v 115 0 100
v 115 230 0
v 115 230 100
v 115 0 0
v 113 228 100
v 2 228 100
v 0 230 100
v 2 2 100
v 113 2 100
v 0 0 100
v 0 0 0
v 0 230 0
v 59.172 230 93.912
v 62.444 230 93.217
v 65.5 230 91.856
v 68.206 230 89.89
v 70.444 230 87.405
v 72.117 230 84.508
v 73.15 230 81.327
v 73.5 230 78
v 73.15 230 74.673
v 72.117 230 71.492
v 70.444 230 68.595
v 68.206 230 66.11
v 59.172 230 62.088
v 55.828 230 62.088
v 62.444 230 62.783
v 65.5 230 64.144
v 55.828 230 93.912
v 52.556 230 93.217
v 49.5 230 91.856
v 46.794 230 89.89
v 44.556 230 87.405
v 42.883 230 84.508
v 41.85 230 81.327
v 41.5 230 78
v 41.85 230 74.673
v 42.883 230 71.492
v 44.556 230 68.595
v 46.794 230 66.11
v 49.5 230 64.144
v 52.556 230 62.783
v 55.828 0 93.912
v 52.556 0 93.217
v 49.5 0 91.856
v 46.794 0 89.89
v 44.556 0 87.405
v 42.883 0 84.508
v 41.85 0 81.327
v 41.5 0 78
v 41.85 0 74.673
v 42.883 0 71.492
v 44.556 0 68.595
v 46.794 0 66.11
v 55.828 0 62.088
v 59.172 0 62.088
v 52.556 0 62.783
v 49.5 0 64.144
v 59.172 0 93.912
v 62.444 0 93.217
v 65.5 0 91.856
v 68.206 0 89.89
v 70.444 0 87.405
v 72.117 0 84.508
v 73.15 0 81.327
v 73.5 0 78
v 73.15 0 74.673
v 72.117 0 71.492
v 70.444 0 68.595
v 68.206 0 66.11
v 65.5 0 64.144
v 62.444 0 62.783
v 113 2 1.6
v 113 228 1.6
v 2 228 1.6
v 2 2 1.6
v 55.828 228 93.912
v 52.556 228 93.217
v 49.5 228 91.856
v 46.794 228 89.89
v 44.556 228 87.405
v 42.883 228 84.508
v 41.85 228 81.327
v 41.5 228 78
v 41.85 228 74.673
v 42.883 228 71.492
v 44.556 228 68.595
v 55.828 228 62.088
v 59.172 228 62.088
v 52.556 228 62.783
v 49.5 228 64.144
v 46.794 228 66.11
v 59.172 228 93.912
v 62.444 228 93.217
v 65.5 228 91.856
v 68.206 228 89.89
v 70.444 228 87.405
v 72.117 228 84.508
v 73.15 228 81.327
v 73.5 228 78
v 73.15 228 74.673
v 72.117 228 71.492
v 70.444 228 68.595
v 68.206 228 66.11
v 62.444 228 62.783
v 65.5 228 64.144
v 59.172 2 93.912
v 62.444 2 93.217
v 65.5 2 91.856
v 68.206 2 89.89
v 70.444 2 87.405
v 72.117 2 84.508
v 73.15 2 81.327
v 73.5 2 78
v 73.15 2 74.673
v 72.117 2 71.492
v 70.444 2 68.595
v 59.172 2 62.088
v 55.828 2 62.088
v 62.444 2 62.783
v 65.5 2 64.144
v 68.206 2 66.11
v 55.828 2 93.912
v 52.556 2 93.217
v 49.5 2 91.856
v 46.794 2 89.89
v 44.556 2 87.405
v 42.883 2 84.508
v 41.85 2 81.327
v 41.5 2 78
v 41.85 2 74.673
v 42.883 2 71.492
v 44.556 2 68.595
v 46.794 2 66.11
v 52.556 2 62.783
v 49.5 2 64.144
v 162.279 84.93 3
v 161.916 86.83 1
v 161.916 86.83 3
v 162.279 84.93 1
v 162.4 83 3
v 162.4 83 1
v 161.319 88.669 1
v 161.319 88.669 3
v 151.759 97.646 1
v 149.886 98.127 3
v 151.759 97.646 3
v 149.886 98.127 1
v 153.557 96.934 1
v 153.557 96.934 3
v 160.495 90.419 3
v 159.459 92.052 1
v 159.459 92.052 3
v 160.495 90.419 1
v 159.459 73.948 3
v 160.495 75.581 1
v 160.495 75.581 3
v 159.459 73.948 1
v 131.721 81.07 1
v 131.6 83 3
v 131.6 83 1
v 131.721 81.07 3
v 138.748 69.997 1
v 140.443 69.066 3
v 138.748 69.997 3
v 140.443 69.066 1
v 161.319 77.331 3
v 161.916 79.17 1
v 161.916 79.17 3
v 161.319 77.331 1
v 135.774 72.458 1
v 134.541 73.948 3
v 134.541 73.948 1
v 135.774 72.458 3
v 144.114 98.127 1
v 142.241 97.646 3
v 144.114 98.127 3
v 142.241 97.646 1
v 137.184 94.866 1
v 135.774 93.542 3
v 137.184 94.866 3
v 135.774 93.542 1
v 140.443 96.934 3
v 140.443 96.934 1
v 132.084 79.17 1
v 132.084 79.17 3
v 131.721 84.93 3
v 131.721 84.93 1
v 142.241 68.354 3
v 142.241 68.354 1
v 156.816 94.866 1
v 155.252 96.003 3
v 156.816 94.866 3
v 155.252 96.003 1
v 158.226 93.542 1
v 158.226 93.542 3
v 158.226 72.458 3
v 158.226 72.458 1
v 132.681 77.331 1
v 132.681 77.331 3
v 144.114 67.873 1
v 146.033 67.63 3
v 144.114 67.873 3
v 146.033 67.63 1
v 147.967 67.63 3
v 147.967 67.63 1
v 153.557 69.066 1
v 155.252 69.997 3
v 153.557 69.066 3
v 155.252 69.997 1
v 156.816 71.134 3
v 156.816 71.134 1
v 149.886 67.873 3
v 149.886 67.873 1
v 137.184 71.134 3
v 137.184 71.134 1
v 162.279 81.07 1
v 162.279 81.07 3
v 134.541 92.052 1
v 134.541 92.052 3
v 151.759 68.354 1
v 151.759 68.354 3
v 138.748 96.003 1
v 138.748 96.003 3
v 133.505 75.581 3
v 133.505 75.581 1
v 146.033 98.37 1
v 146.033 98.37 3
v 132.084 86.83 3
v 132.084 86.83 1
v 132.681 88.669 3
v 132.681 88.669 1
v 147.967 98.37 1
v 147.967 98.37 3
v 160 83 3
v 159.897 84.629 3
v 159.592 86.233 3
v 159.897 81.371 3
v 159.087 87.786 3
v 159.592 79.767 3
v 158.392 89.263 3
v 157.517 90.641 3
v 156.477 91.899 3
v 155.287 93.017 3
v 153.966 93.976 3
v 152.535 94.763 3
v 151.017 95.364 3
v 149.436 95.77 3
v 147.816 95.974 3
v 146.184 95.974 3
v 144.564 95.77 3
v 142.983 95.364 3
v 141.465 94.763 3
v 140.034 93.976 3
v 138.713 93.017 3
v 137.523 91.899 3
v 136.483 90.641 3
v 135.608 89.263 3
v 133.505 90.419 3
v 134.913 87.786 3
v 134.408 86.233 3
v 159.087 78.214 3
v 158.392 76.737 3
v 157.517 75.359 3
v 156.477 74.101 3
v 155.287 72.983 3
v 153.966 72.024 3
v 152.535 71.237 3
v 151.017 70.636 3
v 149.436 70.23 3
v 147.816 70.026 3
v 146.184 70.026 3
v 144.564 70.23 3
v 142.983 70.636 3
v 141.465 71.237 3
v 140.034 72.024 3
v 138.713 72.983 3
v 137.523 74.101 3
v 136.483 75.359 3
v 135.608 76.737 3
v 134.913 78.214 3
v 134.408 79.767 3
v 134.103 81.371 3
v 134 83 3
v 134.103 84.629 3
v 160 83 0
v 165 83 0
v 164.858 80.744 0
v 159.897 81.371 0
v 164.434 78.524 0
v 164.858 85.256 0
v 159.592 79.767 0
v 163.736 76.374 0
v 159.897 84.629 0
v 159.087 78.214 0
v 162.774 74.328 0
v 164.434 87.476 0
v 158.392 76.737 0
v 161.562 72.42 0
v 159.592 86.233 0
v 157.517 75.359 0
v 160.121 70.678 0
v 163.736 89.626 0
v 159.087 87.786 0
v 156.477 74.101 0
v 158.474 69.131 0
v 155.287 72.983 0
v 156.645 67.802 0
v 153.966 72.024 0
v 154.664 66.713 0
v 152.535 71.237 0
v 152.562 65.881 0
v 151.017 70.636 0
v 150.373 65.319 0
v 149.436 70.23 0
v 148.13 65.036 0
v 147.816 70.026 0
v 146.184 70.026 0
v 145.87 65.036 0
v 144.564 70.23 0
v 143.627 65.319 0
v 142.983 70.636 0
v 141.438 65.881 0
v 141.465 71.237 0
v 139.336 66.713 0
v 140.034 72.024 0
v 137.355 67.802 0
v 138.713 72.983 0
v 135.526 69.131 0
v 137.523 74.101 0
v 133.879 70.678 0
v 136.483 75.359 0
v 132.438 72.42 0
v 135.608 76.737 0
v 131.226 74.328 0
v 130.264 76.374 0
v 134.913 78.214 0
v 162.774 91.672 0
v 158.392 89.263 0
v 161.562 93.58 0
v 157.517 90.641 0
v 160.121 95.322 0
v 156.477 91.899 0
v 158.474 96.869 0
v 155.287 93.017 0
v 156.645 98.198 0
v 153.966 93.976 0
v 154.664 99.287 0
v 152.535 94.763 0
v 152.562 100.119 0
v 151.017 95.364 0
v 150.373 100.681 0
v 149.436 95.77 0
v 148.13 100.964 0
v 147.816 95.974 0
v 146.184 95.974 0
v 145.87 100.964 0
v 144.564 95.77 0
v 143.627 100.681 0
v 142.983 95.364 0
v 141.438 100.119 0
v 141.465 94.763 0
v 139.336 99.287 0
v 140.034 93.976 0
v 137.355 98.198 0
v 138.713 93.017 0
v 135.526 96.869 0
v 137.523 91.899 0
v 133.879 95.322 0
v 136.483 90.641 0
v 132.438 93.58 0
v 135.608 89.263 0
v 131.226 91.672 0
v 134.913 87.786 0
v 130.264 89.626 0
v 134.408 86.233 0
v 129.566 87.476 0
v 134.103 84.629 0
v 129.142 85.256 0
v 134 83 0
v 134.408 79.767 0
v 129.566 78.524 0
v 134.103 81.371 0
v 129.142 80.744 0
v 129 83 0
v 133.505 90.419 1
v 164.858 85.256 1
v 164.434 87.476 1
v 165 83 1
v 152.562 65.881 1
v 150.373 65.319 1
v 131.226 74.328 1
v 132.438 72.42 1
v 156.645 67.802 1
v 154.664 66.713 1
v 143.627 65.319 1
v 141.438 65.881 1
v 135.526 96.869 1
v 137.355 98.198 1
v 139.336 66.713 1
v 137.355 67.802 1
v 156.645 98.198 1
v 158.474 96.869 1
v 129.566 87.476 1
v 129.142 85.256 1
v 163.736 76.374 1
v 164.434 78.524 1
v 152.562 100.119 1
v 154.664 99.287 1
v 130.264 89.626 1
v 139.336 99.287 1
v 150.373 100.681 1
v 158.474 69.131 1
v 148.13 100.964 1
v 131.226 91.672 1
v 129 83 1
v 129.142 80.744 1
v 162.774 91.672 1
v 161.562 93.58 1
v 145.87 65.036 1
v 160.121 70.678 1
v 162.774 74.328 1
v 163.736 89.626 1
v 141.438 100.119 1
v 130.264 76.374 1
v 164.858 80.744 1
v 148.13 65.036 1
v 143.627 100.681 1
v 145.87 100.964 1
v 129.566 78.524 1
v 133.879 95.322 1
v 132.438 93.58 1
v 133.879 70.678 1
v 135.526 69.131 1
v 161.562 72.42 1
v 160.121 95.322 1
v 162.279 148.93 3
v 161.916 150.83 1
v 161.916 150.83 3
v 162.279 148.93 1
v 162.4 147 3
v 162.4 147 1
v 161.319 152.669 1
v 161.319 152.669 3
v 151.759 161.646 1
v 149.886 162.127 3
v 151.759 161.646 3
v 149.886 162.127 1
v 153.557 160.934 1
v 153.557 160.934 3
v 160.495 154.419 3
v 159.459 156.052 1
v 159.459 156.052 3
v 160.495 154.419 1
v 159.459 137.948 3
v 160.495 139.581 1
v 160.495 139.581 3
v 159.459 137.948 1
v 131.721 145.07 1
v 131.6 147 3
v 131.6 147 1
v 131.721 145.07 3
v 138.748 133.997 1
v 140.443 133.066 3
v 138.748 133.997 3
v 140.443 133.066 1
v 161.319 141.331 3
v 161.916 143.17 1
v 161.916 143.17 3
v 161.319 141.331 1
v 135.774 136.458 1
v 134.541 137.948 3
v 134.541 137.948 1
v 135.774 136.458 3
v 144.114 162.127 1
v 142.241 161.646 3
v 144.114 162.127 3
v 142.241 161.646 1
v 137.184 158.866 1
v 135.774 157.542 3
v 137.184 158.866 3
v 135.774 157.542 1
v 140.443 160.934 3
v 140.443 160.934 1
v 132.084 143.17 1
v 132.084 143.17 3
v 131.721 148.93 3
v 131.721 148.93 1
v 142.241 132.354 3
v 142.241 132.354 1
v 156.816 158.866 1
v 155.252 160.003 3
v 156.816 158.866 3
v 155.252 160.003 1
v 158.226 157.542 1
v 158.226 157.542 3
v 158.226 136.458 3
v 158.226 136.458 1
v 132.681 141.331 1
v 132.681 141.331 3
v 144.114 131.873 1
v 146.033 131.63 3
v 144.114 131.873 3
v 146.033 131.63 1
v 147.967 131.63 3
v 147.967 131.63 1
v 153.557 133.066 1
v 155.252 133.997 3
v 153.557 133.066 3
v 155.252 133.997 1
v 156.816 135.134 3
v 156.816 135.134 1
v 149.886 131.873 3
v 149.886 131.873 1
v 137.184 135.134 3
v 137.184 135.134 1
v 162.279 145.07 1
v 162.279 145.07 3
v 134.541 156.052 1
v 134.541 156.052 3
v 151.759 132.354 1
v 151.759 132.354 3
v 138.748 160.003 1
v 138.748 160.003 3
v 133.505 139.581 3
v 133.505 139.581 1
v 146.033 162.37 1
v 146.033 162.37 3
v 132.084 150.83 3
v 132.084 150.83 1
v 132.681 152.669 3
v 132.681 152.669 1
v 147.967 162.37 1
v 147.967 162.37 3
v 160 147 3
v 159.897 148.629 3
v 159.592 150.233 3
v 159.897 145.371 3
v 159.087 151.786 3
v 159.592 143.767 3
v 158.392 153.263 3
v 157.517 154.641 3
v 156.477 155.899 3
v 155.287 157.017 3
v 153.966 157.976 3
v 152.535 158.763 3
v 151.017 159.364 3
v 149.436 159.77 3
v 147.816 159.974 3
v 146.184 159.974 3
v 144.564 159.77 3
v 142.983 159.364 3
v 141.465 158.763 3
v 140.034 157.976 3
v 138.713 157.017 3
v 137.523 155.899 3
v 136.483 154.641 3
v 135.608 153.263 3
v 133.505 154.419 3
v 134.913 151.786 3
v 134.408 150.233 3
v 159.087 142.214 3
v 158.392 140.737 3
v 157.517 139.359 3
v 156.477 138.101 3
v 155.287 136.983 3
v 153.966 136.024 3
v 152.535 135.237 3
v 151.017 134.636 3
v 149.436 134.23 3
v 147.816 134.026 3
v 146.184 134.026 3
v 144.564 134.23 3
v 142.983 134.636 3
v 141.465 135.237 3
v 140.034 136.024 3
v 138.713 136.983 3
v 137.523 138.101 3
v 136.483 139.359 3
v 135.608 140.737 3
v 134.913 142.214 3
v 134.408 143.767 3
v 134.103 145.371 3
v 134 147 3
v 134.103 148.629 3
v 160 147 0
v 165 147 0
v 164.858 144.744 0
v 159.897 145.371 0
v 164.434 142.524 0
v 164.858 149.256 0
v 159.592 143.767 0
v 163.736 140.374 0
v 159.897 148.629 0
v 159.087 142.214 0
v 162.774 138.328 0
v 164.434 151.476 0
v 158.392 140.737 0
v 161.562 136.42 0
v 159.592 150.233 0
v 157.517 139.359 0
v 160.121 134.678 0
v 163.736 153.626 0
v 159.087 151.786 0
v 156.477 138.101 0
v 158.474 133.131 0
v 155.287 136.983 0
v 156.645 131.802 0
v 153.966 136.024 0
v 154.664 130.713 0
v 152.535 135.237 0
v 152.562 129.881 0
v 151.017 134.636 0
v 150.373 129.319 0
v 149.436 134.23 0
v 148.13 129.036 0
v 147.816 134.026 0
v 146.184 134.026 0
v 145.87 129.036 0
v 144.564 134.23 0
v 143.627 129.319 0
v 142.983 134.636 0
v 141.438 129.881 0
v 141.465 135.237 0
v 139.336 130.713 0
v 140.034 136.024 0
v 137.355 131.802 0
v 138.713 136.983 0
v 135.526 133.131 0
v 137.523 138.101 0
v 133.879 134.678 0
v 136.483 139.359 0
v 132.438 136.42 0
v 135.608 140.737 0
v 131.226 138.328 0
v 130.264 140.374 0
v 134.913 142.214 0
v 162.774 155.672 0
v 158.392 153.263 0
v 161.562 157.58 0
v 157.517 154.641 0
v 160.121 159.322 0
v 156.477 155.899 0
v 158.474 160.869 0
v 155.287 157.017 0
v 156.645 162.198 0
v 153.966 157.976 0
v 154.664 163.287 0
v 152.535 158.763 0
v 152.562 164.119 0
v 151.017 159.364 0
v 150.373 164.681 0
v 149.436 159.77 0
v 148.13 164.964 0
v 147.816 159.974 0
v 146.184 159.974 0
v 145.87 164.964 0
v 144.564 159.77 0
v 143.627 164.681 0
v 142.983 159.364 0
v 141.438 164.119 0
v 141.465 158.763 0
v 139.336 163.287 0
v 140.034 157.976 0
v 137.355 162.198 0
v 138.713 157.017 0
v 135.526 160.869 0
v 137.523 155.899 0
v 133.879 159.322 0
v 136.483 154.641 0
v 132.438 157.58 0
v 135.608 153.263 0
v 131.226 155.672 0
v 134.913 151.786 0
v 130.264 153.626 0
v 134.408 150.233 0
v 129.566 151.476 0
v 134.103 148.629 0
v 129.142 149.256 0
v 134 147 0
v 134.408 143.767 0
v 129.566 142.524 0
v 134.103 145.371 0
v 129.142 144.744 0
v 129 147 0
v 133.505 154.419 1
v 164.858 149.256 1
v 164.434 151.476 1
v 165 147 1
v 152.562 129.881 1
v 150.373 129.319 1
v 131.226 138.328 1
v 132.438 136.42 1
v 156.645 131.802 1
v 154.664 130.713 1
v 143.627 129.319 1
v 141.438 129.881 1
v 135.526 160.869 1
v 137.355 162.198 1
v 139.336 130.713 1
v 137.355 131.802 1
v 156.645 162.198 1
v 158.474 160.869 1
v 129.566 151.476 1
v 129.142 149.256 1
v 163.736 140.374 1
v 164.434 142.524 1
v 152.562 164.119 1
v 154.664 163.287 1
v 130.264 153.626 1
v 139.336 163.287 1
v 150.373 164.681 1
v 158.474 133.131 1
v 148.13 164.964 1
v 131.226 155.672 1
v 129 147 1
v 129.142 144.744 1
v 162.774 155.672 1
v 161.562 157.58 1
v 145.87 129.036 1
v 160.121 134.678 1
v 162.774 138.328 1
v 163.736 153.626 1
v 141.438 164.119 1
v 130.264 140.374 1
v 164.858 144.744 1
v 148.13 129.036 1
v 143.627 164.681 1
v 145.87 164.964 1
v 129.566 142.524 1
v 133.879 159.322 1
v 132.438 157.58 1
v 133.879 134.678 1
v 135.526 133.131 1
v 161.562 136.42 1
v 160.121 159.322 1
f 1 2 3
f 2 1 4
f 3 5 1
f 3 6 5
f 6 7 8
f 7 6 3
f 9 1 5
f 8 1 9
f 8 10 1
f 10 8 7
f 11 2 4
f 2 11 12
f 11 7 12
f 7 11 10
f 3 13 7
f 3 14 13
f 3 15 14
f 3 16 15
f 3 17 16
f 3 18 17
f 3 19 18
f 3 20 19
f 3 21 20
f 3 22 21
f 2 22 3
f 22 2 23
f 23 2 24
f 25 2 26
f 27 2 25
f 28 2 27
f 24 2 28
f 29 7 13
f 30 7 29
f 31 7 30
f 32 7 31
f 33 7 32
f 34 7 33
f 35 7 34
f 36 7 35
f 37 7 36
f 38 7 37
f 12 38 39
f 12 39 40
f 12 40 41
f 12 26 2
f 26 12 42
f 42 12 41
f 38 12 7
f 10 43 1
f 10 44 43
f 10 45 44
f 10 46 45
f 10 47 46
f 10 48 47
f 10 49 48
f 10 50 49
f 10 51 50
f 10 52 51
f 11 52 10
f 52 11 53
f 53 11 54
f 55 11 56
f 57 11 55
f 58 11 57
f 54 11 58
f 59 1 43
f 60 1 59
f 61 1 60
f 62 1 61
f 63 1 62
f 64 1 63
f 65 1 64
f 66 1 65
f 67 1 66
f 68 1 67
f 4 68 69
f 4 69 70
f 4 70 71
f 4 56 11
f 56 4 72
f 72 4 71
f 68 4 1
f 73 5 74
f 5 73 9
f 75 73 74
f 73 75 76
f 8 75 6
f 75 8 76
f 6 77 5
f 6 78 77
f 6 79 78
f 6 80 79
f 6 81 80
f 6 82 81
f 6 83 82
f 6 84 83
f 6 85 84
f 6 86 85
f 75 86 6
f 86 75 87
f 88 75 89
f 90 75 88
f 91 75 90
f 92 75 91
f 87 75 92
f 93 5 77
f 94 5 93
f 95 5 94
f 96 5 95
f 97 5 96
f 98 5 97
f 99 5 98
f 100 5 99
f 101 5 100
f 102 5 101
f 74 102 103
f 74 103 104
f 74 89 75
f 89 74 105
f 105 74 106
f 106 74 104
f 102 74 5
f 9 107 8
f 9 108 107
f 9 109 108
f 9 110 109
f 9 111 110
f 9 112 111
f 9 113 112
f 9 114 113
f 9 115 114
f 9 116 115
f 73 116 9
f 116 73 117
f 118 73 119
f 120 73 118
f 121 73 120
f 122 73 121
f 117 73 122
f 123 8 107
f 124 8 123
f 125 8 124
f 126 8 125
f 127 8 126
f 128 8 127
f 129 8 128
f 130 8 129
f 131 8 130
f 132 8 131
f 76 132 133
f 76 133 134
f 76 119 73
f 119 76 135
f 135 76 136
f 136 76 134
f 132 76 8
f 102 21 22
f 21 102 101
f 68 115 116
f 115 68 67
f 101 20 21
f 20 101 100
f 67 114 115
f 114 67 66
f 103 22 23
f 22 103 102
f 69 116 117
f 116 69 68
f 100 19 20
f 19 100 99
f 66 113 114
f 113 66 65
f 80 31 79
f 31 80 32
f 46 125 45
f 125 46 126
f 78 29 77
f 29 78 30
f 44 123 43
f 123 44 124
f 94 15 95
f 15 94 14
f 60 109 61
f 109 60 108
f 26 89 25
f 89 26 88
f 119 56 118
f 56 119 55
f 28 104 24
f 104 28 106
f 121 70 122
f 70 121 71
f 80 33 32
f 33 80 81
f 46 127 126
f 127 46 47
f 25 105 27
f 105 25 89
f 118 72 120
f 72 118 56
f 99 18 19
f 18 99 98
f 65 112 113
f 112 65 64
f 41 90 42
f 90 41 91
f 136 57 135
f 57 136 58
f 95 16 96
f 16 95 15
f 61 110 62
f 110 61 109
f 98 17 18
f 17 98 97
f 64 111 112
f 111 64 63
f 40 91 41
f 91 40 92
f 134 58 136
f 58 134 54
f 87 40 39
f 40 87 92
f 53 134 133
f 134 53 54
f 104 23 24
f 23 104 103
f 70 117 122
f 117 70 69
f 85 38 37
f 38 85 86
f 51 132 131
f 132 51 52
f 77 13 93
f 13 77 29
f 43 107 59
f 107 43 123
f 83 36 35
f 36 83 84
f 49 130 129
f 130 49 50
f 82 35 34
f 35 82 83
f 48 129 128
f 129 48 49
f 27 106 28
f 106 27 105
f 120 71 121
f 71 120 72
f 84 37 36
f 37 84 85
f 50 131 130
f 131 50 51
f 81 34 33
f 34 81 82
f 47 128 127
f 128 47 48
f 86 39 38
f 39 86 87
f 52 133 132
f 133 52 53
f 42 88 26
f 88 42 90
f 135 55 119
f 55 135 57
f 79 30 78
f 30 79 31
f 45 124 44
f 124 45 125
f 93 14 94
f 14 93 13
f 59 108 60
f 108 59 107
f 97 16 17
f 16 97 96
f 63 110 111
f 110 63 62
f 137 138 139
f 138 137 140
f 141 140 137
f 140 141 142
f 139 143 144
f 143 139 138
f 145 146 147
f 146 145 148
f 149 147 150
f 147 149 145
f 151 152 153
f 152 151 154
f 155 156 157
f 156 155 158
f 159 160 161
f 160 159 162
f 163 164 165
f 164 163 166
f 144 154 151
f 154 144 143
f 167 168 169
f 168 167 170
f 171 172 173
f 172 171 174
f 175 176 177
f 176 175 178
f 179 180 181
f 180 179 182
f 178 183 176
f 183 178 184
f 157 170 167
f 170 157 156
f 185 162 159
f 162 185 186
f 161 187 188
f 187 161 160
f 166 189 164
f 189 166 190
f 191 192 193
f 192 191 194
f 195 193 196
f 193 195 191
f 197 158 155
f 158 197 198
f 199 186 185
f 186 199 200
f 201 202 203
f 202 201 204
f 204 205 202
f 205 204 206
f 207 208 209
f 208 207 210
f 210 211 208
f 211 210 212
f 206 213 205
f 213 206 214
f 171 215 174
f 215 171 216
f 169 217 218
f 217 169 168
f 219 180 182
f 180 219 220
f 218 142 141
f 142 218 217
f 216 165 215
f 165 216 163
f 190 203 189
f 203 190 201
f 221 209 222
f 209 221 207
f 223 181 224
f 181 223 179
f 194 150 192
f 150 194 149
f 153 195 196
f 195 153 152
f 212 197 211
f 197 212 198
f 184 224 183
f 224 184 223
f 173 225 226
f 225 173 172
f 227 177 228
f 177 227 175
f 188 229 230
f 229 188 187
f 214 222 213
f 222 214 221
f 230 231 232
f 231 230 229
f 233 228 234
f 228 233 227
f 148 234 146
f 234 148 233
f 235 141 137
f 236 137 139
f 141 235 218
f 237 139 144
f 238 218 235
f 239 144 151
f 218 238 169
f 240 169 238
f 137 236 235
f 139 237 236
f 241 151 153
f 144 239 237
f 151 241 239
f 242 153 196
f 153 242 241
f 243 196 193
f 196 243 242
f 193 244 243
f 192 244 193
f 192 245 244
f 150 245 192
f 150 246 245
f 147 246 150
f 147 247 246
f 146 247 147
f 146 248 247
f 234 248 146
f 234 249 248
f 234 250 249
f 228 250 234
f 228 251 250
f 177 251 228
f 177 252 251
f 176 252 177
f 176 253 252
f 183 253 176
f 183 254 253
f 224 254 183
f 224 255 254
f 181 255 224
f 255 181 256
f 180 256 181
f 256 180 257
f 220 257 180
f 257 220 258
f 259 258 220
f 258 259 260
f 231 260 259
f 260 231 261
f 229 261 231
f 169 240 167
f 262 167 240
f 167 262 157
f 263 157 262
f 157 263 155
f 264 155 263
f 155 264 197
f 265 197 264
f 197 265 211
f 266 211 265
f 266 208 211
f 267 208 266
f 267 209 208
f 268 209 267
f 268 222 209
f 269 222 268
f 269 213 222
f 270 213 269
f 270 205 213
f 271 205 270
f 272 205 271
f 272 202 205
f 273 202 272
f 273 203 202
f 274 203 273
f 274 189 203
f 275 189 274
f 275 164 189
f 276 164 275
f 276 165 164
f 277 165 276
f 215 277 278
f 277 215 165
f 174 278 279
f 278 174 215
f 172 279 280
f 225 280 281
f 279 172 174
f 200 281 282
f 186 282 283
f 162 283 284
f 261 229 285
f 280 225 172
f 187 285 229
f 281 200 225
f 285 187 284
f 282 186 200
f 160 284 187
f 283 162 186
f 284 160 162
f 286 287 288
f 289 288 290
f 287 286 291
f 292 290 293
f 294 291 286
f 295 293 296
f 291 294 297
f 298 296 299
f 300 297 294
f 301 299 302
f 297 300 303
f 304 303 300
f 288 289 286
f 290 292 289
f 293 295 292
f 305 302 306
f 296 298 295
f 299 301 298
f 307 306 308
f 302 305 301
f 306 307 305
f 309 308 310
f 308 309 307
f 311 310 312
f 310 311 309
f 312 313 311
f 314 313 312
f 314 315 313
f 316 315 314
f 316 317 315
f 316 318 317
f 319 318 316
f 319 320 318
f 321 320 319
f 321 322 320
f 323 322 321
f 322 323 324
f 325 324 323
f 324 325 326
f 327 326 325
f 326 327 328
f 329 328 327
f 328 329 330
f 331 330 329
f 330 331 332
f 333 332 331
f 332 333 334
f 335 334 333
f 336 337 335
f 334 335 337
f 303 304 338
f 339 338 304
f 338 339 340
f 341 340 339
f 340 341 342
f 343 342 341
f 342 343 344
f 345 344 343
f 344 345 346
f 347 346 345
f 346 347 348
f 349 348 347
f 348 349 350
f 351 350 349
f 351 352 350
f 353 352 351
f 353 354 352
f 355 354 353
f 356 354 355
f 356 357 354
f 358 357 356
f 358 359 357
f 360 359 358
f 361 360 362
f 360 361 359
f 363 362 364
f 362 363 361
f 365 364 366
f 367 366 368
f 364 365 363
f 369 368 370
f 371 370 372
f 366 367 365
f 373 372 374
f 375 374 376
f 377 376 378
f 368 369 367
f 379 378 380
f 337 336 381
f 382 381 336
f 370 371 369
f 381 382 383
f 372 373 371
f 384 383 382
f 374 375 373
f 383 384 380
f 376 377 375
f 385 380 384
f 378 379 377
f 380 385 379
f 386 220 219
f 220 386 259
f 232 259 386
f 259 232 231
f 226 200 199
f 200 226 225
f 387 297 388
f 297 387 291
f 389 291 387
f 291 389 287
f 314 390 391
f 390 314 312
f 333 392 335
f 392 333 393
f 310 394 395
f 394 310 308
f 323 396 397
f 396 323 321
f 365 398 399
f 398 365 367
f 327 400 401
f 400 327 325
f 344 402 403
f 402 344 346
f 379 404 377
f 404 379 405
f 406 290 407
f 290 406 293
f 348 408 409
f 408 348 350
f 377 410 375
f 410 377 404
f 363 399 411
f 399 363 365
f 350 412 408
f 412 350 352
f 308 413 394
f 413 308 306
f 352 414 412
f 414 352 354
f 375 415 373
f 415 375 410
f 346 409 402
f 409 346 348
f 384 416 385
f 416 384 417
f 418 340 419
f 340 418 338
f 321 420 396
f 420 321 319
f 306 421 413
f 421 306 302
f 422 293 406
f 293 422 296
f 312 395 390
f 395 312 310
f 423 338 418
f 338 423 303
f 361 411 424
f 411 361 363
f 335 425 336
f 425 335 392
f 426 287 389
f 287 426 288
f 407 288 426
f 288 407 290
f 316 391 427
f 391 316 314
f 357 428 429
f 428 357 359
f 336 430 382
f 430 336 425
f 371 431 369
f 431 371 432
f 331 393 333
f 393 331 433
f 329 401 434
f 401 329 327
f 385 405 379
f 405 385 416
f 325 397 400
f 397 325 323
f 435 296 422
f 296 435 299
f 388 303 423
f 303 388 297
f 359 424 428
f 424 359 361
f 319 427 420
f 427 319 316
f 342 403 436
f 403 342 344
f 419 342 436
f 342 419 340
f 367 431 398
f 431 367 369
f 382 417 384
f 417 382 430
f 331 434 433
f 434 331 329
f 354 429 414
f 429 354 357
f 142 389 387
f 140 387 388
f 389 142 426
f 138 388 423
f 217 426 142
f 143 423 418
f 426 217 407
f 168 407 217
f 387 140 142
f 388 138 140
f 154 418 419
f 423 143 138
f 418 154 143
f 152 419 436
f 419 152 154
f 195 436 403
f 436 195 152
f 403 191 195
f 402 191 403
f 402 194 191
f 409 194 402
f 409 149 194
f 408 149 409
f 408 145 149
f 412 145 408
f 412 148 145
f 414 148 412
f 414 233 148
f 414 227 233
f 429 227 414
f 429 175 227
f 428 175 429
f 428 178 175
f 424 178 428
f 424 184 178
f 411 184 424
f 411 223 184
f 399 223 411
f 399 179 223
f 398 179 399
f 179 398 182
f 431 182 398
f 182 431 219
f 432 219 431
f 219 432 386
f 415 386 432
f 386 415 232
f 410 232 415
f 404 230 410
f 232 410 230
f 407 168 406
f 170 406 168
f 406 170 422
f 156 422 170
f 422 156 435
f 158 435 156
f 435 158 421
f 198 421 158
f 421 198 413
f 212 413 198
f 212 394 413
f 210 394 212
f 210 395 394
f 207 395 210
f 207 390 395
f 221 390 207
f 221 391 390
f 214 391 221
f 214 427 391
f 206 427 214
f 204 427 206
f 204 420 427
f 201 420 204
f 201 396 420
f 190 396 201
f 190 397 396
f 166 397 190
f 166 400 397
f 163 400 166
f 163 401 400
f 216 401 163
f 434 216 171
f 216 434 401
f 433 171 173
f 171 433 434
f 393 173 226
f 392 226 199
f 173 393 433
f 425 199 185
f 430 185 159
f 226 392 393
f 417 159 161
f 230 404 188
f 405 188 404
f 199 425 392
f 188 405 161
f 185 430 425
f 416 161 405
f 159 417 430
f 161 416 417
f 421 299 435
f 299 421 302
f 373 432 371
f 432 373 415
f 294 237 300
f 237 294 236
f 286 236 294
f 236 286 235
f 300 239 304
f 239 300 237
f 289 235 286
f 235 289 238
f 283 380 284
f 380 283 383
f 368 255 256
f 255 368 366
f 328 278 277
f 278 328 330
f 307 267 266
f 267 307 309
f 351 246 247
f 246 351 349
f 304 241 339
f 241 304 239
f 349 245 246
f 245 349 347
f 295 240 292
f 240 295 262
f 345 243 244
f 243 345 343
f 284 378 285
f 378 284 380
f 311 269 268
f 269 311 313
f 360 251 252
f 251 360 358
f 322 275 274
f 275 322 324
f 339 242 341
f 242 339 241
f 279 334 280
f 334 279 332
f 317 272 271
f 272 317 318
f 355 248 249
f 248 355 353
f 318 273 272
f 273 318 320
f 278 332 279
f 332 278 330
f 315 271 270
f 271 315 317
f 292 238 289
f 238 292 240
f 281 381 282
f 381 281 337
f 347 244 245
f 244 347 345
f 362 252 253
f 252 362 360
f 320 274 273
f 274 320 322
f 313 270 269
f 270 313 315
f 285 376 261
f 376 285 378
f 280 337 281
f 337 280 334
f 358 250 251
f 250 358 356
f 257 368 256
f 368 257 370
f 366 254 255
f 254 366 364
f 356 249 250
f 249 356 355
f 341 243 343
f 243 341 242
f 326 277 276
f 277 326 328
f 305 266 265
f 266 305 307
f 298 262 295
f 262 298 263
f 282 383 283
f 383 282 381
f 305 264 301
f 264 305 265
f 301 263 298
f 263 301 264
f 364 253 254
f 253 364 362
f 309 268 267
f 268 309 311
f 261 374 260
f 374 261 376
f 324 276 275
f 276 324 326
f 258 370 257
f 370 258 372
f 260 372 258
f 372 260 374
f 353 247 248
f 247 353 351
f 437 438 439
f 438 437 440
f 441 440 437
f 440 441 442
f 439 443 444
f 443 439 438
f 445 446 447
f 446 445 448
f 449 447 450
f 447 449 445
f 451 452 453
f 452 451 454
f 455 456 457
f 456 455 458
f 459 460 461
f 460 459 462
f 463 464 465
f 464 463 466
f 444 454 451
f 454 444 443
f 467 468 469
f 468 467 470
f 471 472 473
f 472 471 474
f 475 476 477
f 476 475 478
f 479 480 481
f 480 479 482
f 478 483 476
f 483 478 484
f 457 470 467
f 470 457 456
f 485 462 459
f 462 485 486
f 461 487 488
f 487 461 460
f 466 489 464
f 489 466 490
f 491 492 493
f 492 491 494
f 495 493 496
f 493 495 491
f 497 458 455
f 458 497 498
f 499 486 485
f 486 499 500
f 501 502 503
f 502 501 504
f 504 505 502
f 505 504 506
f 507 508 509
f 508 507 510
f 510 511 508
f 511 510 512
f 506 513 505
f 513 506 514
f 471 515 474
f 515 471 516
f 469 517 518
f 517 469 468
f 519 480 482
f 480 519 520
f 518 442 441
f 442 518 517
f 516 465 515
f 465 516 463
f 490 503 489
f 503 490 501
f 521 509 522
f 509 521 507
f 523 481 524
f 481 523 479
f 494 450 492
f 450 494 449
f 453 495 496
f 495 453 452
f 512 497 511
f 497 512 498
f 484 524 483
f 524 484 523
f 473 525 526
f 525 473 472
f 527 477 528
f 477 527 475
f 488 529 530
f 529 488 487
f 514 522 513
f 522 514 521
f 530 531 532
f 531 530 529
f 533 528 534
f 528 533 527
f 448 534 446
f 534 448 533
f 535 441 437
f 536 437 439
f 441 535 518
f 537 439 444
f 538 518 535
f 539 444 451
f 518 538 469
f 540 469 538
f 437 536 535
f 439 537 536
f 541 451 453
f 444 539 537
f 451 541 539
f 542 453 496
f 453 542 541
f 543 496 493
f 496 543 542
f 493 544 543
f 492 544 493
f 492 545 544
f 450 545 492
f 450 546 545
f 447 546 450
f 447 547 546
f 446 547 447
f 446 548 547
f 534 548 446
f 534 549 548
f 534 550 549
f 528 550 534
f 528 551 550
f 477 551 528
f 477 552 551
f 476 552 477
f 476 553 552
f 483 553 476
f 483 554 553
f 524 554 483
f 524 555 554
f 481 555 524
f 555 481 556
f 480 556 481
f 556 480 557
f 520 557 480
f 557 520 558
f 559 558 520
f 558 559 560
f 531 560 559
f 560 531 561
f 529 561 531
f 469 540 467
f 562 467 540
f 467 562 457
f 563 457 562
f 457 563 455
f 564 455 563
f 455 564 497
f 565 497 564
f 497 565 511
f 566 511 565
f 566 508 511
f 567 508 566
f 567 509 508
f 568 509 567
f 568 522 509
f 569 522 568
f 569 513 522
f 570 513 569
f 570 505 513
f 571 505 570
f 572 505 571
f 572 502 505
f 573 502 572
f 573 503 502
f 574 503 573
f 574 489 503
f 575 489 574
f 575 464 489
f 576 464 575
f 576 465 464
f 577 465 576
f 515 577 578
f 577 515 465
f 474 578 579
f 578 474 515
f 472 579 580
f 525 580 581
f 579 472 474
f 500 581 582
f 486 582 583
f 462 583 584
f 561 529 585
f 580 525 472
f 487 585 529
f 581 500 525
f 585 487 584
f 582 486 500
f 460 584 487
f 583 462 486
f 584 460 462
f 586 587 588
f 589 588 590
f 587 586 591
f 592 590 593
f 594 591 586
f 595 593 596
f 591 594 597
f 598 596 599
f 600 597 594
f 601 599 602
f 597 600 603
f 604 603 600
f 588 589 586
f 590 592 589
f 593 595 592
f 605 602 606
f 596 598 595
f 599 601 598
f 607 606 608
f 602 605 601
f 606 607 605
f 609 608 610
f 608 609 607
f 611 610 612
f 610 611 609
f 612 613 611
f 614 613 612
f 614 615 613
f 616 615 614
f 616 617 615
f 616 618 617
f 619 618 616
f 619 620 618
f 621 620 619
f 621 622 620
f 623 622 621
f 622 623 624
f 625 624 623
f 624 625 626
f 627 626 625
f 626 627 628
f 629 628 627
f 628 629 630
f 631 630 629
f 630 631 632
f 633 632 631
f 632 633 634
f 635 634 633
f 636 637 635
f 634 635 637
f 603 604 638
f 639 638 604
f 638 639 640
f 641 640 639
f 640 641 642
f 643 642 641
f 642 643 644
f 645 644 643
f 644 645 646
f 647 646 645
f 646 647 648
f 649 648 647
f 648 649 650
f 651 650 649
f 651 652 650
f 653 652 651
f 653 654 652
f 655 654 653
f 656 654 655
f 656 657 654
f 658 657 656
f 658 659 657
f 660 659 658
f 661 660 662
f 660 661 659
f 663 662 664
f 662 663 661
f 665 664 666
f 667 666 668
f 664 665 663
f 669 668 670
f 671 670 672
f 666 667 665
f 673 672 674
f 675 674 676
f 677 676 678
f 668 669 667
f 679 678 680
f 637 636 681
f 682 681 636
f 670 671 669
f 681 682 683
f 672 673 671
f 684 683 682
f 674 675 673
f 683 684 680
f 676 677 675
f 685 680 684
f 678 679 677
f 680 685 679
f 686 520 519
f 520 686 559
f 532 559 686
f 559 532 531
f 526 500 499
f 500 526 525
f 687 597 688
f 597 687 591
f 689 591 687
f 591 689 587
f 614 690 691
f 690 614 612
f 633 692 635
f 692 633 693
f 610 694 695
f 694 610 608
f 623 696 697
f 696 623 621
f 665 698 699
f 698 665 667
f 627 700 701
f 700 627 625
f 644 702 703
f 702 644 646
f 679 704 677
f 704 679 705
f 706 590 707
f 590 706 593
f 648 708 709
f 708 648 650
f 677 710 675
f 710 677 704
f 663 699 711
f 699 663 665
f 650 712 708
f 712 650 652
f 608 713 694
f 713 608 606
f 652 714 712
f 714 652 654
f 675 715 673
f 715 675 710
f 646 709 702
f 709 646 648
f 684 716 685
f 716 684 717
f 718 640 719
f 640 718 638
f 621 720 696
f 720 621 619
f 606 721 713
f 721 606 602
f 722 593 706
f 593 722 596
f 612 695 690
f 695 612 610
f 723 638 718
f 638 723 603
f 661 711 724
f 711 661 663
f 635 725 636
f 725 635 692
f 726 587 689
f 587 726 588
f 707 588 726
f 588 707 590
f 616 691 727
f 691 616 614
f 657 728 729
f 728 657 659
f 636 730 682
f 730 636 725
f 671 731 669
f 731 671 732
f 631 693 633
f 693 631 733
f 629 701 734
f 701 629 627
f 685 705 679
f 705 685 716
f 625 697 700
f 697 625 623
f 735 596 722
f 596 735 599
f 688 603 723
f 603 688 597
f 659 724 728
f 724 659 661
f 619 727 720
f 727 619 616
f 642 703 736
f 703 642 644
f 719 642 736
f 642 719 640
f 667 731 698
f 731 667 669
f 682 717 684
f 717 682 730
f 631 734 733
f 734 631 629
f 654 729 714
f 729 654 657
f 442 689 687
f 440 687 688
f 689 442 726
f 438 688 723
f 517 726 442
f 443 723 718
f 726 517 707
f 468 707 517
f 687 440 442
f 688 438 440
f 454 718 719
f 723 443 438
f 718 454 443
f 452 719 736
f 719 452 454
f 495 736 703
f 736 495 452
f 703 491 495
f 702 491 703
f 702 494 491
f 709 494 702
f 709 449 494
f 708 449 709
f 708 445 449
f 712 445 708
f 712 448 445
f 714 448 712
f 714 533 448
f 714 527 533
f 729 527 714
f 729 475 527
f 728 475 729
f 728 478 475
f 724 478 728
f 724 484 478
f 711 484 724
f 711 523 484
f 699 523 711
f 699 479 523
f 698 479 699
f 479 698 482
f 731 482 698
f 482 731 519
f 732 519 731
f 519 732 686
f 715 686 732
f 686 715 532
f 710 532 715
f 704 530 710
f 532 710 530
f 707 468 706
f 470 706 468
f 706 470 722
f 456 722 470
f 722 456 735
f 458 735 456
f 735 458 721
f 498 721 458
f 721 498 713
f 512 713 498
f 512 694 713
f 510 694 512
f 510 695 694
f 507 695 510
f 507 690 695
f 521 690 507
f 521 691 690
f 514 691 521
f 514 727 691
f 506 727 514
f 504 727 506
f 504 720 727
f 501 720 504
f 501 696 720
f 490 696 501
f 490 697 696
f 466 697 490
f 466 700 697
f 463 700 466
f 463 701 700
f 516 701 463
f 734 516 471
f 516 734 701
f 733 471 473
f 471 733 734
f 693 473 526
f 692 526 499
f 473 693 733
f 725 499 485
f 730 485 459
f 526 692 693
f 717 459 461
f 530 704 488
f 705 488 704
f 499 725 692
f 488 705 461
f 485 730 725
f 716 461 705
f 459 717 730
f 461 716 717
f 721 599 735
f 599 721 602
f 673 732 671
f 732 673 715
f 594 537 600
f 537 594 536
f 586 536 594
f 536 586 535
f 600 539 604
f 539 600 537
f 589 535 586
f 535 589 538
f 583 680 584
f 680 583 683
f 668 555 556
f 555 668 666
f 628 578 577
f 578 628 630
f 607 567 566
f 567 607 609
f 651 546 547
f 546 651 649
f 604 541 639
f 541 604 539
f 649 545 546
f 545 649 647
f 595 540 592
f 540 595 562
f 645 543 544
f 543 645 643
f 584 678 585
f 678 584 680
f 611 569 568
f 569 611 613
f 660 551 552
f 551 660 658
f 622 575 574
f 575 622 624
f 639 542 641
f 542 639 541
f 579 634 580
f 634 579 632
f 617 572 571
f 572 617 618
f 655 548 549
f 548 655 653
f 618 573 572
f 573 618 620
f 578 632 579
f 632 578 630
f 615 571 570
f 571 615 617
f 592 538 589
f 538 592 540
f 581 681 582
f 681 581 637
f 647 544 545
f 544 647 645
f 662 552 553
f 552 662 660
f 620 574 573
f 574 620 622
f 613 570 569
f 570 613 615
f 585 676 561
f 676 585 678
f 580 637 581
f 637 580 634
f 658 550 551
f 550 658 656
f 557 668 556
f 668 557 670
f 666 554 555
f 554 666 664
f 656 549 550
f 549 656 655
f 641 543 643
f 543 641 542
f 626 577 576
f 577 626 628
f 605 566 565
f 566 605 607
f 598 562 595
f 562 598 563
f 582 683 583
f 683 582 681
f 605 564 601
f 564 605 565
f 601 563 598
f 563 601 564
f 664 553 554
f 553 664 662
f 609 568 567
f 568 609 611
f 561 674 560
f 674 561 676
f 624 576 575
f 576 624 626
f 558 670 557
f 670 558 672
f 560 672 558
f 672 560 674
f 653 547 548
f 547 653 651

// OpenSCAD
// Customizable Connectors
// Author Mathias Dietz
// http://gcodeprintr.dietzm.de

//Width
x=115;
//Length
y=230;
//Height
h=100;
//Wall thickness
thx=2;
//Bottom thickness
bt=1.60;
//Radius handles 
l2=16;

//Handle inset
inset=0;// [0:yes,1:no]

/* [Hidden] */
//l=0; //Save material by adding holes to the bottom

box(); 
if ( inset==0 ){
 translate([x+l2*2,y/2-l2*2,0]) griffeinsatz();
 translate([x+l2*2,y/2+l2*2,0]) griffeinsatz();
}

module box(){
difference(){
cube([x,y,h]);
//innere kante
translate([thx,thx,bt]) cube([x-(2*thx),y-(2*thx),h]);

//BODENLÖCHER
//translate([x/2,y/2,0])  cylinder(r=l,h=bt);
//translate([x/4,y-y/4,0])  cylinder(r=l,h=bt);
//translate([x/4,y/4,0])  cylinder(r=l,h=bt);
//translate([x-x/4,y/4,0])  cylinder(r=l,h=bt);
//translate([x-x/4,y-y/4,0])  cylinder(r=l,h=bt);

//GRIFFE
translate([x/2,-0.5,h-l2-(3*thx)]) rotate([-90,0,0]) cylinder(r=l2,h=y+2);
}
}

module griffeinsatz(){
$fn=50;
difference(){
union(){
cylinder(r=l2-0.6,h=3);
cylinder(r=l2+2,h=1);
}
cylinder(r=l2-3,h=3);

}
}
